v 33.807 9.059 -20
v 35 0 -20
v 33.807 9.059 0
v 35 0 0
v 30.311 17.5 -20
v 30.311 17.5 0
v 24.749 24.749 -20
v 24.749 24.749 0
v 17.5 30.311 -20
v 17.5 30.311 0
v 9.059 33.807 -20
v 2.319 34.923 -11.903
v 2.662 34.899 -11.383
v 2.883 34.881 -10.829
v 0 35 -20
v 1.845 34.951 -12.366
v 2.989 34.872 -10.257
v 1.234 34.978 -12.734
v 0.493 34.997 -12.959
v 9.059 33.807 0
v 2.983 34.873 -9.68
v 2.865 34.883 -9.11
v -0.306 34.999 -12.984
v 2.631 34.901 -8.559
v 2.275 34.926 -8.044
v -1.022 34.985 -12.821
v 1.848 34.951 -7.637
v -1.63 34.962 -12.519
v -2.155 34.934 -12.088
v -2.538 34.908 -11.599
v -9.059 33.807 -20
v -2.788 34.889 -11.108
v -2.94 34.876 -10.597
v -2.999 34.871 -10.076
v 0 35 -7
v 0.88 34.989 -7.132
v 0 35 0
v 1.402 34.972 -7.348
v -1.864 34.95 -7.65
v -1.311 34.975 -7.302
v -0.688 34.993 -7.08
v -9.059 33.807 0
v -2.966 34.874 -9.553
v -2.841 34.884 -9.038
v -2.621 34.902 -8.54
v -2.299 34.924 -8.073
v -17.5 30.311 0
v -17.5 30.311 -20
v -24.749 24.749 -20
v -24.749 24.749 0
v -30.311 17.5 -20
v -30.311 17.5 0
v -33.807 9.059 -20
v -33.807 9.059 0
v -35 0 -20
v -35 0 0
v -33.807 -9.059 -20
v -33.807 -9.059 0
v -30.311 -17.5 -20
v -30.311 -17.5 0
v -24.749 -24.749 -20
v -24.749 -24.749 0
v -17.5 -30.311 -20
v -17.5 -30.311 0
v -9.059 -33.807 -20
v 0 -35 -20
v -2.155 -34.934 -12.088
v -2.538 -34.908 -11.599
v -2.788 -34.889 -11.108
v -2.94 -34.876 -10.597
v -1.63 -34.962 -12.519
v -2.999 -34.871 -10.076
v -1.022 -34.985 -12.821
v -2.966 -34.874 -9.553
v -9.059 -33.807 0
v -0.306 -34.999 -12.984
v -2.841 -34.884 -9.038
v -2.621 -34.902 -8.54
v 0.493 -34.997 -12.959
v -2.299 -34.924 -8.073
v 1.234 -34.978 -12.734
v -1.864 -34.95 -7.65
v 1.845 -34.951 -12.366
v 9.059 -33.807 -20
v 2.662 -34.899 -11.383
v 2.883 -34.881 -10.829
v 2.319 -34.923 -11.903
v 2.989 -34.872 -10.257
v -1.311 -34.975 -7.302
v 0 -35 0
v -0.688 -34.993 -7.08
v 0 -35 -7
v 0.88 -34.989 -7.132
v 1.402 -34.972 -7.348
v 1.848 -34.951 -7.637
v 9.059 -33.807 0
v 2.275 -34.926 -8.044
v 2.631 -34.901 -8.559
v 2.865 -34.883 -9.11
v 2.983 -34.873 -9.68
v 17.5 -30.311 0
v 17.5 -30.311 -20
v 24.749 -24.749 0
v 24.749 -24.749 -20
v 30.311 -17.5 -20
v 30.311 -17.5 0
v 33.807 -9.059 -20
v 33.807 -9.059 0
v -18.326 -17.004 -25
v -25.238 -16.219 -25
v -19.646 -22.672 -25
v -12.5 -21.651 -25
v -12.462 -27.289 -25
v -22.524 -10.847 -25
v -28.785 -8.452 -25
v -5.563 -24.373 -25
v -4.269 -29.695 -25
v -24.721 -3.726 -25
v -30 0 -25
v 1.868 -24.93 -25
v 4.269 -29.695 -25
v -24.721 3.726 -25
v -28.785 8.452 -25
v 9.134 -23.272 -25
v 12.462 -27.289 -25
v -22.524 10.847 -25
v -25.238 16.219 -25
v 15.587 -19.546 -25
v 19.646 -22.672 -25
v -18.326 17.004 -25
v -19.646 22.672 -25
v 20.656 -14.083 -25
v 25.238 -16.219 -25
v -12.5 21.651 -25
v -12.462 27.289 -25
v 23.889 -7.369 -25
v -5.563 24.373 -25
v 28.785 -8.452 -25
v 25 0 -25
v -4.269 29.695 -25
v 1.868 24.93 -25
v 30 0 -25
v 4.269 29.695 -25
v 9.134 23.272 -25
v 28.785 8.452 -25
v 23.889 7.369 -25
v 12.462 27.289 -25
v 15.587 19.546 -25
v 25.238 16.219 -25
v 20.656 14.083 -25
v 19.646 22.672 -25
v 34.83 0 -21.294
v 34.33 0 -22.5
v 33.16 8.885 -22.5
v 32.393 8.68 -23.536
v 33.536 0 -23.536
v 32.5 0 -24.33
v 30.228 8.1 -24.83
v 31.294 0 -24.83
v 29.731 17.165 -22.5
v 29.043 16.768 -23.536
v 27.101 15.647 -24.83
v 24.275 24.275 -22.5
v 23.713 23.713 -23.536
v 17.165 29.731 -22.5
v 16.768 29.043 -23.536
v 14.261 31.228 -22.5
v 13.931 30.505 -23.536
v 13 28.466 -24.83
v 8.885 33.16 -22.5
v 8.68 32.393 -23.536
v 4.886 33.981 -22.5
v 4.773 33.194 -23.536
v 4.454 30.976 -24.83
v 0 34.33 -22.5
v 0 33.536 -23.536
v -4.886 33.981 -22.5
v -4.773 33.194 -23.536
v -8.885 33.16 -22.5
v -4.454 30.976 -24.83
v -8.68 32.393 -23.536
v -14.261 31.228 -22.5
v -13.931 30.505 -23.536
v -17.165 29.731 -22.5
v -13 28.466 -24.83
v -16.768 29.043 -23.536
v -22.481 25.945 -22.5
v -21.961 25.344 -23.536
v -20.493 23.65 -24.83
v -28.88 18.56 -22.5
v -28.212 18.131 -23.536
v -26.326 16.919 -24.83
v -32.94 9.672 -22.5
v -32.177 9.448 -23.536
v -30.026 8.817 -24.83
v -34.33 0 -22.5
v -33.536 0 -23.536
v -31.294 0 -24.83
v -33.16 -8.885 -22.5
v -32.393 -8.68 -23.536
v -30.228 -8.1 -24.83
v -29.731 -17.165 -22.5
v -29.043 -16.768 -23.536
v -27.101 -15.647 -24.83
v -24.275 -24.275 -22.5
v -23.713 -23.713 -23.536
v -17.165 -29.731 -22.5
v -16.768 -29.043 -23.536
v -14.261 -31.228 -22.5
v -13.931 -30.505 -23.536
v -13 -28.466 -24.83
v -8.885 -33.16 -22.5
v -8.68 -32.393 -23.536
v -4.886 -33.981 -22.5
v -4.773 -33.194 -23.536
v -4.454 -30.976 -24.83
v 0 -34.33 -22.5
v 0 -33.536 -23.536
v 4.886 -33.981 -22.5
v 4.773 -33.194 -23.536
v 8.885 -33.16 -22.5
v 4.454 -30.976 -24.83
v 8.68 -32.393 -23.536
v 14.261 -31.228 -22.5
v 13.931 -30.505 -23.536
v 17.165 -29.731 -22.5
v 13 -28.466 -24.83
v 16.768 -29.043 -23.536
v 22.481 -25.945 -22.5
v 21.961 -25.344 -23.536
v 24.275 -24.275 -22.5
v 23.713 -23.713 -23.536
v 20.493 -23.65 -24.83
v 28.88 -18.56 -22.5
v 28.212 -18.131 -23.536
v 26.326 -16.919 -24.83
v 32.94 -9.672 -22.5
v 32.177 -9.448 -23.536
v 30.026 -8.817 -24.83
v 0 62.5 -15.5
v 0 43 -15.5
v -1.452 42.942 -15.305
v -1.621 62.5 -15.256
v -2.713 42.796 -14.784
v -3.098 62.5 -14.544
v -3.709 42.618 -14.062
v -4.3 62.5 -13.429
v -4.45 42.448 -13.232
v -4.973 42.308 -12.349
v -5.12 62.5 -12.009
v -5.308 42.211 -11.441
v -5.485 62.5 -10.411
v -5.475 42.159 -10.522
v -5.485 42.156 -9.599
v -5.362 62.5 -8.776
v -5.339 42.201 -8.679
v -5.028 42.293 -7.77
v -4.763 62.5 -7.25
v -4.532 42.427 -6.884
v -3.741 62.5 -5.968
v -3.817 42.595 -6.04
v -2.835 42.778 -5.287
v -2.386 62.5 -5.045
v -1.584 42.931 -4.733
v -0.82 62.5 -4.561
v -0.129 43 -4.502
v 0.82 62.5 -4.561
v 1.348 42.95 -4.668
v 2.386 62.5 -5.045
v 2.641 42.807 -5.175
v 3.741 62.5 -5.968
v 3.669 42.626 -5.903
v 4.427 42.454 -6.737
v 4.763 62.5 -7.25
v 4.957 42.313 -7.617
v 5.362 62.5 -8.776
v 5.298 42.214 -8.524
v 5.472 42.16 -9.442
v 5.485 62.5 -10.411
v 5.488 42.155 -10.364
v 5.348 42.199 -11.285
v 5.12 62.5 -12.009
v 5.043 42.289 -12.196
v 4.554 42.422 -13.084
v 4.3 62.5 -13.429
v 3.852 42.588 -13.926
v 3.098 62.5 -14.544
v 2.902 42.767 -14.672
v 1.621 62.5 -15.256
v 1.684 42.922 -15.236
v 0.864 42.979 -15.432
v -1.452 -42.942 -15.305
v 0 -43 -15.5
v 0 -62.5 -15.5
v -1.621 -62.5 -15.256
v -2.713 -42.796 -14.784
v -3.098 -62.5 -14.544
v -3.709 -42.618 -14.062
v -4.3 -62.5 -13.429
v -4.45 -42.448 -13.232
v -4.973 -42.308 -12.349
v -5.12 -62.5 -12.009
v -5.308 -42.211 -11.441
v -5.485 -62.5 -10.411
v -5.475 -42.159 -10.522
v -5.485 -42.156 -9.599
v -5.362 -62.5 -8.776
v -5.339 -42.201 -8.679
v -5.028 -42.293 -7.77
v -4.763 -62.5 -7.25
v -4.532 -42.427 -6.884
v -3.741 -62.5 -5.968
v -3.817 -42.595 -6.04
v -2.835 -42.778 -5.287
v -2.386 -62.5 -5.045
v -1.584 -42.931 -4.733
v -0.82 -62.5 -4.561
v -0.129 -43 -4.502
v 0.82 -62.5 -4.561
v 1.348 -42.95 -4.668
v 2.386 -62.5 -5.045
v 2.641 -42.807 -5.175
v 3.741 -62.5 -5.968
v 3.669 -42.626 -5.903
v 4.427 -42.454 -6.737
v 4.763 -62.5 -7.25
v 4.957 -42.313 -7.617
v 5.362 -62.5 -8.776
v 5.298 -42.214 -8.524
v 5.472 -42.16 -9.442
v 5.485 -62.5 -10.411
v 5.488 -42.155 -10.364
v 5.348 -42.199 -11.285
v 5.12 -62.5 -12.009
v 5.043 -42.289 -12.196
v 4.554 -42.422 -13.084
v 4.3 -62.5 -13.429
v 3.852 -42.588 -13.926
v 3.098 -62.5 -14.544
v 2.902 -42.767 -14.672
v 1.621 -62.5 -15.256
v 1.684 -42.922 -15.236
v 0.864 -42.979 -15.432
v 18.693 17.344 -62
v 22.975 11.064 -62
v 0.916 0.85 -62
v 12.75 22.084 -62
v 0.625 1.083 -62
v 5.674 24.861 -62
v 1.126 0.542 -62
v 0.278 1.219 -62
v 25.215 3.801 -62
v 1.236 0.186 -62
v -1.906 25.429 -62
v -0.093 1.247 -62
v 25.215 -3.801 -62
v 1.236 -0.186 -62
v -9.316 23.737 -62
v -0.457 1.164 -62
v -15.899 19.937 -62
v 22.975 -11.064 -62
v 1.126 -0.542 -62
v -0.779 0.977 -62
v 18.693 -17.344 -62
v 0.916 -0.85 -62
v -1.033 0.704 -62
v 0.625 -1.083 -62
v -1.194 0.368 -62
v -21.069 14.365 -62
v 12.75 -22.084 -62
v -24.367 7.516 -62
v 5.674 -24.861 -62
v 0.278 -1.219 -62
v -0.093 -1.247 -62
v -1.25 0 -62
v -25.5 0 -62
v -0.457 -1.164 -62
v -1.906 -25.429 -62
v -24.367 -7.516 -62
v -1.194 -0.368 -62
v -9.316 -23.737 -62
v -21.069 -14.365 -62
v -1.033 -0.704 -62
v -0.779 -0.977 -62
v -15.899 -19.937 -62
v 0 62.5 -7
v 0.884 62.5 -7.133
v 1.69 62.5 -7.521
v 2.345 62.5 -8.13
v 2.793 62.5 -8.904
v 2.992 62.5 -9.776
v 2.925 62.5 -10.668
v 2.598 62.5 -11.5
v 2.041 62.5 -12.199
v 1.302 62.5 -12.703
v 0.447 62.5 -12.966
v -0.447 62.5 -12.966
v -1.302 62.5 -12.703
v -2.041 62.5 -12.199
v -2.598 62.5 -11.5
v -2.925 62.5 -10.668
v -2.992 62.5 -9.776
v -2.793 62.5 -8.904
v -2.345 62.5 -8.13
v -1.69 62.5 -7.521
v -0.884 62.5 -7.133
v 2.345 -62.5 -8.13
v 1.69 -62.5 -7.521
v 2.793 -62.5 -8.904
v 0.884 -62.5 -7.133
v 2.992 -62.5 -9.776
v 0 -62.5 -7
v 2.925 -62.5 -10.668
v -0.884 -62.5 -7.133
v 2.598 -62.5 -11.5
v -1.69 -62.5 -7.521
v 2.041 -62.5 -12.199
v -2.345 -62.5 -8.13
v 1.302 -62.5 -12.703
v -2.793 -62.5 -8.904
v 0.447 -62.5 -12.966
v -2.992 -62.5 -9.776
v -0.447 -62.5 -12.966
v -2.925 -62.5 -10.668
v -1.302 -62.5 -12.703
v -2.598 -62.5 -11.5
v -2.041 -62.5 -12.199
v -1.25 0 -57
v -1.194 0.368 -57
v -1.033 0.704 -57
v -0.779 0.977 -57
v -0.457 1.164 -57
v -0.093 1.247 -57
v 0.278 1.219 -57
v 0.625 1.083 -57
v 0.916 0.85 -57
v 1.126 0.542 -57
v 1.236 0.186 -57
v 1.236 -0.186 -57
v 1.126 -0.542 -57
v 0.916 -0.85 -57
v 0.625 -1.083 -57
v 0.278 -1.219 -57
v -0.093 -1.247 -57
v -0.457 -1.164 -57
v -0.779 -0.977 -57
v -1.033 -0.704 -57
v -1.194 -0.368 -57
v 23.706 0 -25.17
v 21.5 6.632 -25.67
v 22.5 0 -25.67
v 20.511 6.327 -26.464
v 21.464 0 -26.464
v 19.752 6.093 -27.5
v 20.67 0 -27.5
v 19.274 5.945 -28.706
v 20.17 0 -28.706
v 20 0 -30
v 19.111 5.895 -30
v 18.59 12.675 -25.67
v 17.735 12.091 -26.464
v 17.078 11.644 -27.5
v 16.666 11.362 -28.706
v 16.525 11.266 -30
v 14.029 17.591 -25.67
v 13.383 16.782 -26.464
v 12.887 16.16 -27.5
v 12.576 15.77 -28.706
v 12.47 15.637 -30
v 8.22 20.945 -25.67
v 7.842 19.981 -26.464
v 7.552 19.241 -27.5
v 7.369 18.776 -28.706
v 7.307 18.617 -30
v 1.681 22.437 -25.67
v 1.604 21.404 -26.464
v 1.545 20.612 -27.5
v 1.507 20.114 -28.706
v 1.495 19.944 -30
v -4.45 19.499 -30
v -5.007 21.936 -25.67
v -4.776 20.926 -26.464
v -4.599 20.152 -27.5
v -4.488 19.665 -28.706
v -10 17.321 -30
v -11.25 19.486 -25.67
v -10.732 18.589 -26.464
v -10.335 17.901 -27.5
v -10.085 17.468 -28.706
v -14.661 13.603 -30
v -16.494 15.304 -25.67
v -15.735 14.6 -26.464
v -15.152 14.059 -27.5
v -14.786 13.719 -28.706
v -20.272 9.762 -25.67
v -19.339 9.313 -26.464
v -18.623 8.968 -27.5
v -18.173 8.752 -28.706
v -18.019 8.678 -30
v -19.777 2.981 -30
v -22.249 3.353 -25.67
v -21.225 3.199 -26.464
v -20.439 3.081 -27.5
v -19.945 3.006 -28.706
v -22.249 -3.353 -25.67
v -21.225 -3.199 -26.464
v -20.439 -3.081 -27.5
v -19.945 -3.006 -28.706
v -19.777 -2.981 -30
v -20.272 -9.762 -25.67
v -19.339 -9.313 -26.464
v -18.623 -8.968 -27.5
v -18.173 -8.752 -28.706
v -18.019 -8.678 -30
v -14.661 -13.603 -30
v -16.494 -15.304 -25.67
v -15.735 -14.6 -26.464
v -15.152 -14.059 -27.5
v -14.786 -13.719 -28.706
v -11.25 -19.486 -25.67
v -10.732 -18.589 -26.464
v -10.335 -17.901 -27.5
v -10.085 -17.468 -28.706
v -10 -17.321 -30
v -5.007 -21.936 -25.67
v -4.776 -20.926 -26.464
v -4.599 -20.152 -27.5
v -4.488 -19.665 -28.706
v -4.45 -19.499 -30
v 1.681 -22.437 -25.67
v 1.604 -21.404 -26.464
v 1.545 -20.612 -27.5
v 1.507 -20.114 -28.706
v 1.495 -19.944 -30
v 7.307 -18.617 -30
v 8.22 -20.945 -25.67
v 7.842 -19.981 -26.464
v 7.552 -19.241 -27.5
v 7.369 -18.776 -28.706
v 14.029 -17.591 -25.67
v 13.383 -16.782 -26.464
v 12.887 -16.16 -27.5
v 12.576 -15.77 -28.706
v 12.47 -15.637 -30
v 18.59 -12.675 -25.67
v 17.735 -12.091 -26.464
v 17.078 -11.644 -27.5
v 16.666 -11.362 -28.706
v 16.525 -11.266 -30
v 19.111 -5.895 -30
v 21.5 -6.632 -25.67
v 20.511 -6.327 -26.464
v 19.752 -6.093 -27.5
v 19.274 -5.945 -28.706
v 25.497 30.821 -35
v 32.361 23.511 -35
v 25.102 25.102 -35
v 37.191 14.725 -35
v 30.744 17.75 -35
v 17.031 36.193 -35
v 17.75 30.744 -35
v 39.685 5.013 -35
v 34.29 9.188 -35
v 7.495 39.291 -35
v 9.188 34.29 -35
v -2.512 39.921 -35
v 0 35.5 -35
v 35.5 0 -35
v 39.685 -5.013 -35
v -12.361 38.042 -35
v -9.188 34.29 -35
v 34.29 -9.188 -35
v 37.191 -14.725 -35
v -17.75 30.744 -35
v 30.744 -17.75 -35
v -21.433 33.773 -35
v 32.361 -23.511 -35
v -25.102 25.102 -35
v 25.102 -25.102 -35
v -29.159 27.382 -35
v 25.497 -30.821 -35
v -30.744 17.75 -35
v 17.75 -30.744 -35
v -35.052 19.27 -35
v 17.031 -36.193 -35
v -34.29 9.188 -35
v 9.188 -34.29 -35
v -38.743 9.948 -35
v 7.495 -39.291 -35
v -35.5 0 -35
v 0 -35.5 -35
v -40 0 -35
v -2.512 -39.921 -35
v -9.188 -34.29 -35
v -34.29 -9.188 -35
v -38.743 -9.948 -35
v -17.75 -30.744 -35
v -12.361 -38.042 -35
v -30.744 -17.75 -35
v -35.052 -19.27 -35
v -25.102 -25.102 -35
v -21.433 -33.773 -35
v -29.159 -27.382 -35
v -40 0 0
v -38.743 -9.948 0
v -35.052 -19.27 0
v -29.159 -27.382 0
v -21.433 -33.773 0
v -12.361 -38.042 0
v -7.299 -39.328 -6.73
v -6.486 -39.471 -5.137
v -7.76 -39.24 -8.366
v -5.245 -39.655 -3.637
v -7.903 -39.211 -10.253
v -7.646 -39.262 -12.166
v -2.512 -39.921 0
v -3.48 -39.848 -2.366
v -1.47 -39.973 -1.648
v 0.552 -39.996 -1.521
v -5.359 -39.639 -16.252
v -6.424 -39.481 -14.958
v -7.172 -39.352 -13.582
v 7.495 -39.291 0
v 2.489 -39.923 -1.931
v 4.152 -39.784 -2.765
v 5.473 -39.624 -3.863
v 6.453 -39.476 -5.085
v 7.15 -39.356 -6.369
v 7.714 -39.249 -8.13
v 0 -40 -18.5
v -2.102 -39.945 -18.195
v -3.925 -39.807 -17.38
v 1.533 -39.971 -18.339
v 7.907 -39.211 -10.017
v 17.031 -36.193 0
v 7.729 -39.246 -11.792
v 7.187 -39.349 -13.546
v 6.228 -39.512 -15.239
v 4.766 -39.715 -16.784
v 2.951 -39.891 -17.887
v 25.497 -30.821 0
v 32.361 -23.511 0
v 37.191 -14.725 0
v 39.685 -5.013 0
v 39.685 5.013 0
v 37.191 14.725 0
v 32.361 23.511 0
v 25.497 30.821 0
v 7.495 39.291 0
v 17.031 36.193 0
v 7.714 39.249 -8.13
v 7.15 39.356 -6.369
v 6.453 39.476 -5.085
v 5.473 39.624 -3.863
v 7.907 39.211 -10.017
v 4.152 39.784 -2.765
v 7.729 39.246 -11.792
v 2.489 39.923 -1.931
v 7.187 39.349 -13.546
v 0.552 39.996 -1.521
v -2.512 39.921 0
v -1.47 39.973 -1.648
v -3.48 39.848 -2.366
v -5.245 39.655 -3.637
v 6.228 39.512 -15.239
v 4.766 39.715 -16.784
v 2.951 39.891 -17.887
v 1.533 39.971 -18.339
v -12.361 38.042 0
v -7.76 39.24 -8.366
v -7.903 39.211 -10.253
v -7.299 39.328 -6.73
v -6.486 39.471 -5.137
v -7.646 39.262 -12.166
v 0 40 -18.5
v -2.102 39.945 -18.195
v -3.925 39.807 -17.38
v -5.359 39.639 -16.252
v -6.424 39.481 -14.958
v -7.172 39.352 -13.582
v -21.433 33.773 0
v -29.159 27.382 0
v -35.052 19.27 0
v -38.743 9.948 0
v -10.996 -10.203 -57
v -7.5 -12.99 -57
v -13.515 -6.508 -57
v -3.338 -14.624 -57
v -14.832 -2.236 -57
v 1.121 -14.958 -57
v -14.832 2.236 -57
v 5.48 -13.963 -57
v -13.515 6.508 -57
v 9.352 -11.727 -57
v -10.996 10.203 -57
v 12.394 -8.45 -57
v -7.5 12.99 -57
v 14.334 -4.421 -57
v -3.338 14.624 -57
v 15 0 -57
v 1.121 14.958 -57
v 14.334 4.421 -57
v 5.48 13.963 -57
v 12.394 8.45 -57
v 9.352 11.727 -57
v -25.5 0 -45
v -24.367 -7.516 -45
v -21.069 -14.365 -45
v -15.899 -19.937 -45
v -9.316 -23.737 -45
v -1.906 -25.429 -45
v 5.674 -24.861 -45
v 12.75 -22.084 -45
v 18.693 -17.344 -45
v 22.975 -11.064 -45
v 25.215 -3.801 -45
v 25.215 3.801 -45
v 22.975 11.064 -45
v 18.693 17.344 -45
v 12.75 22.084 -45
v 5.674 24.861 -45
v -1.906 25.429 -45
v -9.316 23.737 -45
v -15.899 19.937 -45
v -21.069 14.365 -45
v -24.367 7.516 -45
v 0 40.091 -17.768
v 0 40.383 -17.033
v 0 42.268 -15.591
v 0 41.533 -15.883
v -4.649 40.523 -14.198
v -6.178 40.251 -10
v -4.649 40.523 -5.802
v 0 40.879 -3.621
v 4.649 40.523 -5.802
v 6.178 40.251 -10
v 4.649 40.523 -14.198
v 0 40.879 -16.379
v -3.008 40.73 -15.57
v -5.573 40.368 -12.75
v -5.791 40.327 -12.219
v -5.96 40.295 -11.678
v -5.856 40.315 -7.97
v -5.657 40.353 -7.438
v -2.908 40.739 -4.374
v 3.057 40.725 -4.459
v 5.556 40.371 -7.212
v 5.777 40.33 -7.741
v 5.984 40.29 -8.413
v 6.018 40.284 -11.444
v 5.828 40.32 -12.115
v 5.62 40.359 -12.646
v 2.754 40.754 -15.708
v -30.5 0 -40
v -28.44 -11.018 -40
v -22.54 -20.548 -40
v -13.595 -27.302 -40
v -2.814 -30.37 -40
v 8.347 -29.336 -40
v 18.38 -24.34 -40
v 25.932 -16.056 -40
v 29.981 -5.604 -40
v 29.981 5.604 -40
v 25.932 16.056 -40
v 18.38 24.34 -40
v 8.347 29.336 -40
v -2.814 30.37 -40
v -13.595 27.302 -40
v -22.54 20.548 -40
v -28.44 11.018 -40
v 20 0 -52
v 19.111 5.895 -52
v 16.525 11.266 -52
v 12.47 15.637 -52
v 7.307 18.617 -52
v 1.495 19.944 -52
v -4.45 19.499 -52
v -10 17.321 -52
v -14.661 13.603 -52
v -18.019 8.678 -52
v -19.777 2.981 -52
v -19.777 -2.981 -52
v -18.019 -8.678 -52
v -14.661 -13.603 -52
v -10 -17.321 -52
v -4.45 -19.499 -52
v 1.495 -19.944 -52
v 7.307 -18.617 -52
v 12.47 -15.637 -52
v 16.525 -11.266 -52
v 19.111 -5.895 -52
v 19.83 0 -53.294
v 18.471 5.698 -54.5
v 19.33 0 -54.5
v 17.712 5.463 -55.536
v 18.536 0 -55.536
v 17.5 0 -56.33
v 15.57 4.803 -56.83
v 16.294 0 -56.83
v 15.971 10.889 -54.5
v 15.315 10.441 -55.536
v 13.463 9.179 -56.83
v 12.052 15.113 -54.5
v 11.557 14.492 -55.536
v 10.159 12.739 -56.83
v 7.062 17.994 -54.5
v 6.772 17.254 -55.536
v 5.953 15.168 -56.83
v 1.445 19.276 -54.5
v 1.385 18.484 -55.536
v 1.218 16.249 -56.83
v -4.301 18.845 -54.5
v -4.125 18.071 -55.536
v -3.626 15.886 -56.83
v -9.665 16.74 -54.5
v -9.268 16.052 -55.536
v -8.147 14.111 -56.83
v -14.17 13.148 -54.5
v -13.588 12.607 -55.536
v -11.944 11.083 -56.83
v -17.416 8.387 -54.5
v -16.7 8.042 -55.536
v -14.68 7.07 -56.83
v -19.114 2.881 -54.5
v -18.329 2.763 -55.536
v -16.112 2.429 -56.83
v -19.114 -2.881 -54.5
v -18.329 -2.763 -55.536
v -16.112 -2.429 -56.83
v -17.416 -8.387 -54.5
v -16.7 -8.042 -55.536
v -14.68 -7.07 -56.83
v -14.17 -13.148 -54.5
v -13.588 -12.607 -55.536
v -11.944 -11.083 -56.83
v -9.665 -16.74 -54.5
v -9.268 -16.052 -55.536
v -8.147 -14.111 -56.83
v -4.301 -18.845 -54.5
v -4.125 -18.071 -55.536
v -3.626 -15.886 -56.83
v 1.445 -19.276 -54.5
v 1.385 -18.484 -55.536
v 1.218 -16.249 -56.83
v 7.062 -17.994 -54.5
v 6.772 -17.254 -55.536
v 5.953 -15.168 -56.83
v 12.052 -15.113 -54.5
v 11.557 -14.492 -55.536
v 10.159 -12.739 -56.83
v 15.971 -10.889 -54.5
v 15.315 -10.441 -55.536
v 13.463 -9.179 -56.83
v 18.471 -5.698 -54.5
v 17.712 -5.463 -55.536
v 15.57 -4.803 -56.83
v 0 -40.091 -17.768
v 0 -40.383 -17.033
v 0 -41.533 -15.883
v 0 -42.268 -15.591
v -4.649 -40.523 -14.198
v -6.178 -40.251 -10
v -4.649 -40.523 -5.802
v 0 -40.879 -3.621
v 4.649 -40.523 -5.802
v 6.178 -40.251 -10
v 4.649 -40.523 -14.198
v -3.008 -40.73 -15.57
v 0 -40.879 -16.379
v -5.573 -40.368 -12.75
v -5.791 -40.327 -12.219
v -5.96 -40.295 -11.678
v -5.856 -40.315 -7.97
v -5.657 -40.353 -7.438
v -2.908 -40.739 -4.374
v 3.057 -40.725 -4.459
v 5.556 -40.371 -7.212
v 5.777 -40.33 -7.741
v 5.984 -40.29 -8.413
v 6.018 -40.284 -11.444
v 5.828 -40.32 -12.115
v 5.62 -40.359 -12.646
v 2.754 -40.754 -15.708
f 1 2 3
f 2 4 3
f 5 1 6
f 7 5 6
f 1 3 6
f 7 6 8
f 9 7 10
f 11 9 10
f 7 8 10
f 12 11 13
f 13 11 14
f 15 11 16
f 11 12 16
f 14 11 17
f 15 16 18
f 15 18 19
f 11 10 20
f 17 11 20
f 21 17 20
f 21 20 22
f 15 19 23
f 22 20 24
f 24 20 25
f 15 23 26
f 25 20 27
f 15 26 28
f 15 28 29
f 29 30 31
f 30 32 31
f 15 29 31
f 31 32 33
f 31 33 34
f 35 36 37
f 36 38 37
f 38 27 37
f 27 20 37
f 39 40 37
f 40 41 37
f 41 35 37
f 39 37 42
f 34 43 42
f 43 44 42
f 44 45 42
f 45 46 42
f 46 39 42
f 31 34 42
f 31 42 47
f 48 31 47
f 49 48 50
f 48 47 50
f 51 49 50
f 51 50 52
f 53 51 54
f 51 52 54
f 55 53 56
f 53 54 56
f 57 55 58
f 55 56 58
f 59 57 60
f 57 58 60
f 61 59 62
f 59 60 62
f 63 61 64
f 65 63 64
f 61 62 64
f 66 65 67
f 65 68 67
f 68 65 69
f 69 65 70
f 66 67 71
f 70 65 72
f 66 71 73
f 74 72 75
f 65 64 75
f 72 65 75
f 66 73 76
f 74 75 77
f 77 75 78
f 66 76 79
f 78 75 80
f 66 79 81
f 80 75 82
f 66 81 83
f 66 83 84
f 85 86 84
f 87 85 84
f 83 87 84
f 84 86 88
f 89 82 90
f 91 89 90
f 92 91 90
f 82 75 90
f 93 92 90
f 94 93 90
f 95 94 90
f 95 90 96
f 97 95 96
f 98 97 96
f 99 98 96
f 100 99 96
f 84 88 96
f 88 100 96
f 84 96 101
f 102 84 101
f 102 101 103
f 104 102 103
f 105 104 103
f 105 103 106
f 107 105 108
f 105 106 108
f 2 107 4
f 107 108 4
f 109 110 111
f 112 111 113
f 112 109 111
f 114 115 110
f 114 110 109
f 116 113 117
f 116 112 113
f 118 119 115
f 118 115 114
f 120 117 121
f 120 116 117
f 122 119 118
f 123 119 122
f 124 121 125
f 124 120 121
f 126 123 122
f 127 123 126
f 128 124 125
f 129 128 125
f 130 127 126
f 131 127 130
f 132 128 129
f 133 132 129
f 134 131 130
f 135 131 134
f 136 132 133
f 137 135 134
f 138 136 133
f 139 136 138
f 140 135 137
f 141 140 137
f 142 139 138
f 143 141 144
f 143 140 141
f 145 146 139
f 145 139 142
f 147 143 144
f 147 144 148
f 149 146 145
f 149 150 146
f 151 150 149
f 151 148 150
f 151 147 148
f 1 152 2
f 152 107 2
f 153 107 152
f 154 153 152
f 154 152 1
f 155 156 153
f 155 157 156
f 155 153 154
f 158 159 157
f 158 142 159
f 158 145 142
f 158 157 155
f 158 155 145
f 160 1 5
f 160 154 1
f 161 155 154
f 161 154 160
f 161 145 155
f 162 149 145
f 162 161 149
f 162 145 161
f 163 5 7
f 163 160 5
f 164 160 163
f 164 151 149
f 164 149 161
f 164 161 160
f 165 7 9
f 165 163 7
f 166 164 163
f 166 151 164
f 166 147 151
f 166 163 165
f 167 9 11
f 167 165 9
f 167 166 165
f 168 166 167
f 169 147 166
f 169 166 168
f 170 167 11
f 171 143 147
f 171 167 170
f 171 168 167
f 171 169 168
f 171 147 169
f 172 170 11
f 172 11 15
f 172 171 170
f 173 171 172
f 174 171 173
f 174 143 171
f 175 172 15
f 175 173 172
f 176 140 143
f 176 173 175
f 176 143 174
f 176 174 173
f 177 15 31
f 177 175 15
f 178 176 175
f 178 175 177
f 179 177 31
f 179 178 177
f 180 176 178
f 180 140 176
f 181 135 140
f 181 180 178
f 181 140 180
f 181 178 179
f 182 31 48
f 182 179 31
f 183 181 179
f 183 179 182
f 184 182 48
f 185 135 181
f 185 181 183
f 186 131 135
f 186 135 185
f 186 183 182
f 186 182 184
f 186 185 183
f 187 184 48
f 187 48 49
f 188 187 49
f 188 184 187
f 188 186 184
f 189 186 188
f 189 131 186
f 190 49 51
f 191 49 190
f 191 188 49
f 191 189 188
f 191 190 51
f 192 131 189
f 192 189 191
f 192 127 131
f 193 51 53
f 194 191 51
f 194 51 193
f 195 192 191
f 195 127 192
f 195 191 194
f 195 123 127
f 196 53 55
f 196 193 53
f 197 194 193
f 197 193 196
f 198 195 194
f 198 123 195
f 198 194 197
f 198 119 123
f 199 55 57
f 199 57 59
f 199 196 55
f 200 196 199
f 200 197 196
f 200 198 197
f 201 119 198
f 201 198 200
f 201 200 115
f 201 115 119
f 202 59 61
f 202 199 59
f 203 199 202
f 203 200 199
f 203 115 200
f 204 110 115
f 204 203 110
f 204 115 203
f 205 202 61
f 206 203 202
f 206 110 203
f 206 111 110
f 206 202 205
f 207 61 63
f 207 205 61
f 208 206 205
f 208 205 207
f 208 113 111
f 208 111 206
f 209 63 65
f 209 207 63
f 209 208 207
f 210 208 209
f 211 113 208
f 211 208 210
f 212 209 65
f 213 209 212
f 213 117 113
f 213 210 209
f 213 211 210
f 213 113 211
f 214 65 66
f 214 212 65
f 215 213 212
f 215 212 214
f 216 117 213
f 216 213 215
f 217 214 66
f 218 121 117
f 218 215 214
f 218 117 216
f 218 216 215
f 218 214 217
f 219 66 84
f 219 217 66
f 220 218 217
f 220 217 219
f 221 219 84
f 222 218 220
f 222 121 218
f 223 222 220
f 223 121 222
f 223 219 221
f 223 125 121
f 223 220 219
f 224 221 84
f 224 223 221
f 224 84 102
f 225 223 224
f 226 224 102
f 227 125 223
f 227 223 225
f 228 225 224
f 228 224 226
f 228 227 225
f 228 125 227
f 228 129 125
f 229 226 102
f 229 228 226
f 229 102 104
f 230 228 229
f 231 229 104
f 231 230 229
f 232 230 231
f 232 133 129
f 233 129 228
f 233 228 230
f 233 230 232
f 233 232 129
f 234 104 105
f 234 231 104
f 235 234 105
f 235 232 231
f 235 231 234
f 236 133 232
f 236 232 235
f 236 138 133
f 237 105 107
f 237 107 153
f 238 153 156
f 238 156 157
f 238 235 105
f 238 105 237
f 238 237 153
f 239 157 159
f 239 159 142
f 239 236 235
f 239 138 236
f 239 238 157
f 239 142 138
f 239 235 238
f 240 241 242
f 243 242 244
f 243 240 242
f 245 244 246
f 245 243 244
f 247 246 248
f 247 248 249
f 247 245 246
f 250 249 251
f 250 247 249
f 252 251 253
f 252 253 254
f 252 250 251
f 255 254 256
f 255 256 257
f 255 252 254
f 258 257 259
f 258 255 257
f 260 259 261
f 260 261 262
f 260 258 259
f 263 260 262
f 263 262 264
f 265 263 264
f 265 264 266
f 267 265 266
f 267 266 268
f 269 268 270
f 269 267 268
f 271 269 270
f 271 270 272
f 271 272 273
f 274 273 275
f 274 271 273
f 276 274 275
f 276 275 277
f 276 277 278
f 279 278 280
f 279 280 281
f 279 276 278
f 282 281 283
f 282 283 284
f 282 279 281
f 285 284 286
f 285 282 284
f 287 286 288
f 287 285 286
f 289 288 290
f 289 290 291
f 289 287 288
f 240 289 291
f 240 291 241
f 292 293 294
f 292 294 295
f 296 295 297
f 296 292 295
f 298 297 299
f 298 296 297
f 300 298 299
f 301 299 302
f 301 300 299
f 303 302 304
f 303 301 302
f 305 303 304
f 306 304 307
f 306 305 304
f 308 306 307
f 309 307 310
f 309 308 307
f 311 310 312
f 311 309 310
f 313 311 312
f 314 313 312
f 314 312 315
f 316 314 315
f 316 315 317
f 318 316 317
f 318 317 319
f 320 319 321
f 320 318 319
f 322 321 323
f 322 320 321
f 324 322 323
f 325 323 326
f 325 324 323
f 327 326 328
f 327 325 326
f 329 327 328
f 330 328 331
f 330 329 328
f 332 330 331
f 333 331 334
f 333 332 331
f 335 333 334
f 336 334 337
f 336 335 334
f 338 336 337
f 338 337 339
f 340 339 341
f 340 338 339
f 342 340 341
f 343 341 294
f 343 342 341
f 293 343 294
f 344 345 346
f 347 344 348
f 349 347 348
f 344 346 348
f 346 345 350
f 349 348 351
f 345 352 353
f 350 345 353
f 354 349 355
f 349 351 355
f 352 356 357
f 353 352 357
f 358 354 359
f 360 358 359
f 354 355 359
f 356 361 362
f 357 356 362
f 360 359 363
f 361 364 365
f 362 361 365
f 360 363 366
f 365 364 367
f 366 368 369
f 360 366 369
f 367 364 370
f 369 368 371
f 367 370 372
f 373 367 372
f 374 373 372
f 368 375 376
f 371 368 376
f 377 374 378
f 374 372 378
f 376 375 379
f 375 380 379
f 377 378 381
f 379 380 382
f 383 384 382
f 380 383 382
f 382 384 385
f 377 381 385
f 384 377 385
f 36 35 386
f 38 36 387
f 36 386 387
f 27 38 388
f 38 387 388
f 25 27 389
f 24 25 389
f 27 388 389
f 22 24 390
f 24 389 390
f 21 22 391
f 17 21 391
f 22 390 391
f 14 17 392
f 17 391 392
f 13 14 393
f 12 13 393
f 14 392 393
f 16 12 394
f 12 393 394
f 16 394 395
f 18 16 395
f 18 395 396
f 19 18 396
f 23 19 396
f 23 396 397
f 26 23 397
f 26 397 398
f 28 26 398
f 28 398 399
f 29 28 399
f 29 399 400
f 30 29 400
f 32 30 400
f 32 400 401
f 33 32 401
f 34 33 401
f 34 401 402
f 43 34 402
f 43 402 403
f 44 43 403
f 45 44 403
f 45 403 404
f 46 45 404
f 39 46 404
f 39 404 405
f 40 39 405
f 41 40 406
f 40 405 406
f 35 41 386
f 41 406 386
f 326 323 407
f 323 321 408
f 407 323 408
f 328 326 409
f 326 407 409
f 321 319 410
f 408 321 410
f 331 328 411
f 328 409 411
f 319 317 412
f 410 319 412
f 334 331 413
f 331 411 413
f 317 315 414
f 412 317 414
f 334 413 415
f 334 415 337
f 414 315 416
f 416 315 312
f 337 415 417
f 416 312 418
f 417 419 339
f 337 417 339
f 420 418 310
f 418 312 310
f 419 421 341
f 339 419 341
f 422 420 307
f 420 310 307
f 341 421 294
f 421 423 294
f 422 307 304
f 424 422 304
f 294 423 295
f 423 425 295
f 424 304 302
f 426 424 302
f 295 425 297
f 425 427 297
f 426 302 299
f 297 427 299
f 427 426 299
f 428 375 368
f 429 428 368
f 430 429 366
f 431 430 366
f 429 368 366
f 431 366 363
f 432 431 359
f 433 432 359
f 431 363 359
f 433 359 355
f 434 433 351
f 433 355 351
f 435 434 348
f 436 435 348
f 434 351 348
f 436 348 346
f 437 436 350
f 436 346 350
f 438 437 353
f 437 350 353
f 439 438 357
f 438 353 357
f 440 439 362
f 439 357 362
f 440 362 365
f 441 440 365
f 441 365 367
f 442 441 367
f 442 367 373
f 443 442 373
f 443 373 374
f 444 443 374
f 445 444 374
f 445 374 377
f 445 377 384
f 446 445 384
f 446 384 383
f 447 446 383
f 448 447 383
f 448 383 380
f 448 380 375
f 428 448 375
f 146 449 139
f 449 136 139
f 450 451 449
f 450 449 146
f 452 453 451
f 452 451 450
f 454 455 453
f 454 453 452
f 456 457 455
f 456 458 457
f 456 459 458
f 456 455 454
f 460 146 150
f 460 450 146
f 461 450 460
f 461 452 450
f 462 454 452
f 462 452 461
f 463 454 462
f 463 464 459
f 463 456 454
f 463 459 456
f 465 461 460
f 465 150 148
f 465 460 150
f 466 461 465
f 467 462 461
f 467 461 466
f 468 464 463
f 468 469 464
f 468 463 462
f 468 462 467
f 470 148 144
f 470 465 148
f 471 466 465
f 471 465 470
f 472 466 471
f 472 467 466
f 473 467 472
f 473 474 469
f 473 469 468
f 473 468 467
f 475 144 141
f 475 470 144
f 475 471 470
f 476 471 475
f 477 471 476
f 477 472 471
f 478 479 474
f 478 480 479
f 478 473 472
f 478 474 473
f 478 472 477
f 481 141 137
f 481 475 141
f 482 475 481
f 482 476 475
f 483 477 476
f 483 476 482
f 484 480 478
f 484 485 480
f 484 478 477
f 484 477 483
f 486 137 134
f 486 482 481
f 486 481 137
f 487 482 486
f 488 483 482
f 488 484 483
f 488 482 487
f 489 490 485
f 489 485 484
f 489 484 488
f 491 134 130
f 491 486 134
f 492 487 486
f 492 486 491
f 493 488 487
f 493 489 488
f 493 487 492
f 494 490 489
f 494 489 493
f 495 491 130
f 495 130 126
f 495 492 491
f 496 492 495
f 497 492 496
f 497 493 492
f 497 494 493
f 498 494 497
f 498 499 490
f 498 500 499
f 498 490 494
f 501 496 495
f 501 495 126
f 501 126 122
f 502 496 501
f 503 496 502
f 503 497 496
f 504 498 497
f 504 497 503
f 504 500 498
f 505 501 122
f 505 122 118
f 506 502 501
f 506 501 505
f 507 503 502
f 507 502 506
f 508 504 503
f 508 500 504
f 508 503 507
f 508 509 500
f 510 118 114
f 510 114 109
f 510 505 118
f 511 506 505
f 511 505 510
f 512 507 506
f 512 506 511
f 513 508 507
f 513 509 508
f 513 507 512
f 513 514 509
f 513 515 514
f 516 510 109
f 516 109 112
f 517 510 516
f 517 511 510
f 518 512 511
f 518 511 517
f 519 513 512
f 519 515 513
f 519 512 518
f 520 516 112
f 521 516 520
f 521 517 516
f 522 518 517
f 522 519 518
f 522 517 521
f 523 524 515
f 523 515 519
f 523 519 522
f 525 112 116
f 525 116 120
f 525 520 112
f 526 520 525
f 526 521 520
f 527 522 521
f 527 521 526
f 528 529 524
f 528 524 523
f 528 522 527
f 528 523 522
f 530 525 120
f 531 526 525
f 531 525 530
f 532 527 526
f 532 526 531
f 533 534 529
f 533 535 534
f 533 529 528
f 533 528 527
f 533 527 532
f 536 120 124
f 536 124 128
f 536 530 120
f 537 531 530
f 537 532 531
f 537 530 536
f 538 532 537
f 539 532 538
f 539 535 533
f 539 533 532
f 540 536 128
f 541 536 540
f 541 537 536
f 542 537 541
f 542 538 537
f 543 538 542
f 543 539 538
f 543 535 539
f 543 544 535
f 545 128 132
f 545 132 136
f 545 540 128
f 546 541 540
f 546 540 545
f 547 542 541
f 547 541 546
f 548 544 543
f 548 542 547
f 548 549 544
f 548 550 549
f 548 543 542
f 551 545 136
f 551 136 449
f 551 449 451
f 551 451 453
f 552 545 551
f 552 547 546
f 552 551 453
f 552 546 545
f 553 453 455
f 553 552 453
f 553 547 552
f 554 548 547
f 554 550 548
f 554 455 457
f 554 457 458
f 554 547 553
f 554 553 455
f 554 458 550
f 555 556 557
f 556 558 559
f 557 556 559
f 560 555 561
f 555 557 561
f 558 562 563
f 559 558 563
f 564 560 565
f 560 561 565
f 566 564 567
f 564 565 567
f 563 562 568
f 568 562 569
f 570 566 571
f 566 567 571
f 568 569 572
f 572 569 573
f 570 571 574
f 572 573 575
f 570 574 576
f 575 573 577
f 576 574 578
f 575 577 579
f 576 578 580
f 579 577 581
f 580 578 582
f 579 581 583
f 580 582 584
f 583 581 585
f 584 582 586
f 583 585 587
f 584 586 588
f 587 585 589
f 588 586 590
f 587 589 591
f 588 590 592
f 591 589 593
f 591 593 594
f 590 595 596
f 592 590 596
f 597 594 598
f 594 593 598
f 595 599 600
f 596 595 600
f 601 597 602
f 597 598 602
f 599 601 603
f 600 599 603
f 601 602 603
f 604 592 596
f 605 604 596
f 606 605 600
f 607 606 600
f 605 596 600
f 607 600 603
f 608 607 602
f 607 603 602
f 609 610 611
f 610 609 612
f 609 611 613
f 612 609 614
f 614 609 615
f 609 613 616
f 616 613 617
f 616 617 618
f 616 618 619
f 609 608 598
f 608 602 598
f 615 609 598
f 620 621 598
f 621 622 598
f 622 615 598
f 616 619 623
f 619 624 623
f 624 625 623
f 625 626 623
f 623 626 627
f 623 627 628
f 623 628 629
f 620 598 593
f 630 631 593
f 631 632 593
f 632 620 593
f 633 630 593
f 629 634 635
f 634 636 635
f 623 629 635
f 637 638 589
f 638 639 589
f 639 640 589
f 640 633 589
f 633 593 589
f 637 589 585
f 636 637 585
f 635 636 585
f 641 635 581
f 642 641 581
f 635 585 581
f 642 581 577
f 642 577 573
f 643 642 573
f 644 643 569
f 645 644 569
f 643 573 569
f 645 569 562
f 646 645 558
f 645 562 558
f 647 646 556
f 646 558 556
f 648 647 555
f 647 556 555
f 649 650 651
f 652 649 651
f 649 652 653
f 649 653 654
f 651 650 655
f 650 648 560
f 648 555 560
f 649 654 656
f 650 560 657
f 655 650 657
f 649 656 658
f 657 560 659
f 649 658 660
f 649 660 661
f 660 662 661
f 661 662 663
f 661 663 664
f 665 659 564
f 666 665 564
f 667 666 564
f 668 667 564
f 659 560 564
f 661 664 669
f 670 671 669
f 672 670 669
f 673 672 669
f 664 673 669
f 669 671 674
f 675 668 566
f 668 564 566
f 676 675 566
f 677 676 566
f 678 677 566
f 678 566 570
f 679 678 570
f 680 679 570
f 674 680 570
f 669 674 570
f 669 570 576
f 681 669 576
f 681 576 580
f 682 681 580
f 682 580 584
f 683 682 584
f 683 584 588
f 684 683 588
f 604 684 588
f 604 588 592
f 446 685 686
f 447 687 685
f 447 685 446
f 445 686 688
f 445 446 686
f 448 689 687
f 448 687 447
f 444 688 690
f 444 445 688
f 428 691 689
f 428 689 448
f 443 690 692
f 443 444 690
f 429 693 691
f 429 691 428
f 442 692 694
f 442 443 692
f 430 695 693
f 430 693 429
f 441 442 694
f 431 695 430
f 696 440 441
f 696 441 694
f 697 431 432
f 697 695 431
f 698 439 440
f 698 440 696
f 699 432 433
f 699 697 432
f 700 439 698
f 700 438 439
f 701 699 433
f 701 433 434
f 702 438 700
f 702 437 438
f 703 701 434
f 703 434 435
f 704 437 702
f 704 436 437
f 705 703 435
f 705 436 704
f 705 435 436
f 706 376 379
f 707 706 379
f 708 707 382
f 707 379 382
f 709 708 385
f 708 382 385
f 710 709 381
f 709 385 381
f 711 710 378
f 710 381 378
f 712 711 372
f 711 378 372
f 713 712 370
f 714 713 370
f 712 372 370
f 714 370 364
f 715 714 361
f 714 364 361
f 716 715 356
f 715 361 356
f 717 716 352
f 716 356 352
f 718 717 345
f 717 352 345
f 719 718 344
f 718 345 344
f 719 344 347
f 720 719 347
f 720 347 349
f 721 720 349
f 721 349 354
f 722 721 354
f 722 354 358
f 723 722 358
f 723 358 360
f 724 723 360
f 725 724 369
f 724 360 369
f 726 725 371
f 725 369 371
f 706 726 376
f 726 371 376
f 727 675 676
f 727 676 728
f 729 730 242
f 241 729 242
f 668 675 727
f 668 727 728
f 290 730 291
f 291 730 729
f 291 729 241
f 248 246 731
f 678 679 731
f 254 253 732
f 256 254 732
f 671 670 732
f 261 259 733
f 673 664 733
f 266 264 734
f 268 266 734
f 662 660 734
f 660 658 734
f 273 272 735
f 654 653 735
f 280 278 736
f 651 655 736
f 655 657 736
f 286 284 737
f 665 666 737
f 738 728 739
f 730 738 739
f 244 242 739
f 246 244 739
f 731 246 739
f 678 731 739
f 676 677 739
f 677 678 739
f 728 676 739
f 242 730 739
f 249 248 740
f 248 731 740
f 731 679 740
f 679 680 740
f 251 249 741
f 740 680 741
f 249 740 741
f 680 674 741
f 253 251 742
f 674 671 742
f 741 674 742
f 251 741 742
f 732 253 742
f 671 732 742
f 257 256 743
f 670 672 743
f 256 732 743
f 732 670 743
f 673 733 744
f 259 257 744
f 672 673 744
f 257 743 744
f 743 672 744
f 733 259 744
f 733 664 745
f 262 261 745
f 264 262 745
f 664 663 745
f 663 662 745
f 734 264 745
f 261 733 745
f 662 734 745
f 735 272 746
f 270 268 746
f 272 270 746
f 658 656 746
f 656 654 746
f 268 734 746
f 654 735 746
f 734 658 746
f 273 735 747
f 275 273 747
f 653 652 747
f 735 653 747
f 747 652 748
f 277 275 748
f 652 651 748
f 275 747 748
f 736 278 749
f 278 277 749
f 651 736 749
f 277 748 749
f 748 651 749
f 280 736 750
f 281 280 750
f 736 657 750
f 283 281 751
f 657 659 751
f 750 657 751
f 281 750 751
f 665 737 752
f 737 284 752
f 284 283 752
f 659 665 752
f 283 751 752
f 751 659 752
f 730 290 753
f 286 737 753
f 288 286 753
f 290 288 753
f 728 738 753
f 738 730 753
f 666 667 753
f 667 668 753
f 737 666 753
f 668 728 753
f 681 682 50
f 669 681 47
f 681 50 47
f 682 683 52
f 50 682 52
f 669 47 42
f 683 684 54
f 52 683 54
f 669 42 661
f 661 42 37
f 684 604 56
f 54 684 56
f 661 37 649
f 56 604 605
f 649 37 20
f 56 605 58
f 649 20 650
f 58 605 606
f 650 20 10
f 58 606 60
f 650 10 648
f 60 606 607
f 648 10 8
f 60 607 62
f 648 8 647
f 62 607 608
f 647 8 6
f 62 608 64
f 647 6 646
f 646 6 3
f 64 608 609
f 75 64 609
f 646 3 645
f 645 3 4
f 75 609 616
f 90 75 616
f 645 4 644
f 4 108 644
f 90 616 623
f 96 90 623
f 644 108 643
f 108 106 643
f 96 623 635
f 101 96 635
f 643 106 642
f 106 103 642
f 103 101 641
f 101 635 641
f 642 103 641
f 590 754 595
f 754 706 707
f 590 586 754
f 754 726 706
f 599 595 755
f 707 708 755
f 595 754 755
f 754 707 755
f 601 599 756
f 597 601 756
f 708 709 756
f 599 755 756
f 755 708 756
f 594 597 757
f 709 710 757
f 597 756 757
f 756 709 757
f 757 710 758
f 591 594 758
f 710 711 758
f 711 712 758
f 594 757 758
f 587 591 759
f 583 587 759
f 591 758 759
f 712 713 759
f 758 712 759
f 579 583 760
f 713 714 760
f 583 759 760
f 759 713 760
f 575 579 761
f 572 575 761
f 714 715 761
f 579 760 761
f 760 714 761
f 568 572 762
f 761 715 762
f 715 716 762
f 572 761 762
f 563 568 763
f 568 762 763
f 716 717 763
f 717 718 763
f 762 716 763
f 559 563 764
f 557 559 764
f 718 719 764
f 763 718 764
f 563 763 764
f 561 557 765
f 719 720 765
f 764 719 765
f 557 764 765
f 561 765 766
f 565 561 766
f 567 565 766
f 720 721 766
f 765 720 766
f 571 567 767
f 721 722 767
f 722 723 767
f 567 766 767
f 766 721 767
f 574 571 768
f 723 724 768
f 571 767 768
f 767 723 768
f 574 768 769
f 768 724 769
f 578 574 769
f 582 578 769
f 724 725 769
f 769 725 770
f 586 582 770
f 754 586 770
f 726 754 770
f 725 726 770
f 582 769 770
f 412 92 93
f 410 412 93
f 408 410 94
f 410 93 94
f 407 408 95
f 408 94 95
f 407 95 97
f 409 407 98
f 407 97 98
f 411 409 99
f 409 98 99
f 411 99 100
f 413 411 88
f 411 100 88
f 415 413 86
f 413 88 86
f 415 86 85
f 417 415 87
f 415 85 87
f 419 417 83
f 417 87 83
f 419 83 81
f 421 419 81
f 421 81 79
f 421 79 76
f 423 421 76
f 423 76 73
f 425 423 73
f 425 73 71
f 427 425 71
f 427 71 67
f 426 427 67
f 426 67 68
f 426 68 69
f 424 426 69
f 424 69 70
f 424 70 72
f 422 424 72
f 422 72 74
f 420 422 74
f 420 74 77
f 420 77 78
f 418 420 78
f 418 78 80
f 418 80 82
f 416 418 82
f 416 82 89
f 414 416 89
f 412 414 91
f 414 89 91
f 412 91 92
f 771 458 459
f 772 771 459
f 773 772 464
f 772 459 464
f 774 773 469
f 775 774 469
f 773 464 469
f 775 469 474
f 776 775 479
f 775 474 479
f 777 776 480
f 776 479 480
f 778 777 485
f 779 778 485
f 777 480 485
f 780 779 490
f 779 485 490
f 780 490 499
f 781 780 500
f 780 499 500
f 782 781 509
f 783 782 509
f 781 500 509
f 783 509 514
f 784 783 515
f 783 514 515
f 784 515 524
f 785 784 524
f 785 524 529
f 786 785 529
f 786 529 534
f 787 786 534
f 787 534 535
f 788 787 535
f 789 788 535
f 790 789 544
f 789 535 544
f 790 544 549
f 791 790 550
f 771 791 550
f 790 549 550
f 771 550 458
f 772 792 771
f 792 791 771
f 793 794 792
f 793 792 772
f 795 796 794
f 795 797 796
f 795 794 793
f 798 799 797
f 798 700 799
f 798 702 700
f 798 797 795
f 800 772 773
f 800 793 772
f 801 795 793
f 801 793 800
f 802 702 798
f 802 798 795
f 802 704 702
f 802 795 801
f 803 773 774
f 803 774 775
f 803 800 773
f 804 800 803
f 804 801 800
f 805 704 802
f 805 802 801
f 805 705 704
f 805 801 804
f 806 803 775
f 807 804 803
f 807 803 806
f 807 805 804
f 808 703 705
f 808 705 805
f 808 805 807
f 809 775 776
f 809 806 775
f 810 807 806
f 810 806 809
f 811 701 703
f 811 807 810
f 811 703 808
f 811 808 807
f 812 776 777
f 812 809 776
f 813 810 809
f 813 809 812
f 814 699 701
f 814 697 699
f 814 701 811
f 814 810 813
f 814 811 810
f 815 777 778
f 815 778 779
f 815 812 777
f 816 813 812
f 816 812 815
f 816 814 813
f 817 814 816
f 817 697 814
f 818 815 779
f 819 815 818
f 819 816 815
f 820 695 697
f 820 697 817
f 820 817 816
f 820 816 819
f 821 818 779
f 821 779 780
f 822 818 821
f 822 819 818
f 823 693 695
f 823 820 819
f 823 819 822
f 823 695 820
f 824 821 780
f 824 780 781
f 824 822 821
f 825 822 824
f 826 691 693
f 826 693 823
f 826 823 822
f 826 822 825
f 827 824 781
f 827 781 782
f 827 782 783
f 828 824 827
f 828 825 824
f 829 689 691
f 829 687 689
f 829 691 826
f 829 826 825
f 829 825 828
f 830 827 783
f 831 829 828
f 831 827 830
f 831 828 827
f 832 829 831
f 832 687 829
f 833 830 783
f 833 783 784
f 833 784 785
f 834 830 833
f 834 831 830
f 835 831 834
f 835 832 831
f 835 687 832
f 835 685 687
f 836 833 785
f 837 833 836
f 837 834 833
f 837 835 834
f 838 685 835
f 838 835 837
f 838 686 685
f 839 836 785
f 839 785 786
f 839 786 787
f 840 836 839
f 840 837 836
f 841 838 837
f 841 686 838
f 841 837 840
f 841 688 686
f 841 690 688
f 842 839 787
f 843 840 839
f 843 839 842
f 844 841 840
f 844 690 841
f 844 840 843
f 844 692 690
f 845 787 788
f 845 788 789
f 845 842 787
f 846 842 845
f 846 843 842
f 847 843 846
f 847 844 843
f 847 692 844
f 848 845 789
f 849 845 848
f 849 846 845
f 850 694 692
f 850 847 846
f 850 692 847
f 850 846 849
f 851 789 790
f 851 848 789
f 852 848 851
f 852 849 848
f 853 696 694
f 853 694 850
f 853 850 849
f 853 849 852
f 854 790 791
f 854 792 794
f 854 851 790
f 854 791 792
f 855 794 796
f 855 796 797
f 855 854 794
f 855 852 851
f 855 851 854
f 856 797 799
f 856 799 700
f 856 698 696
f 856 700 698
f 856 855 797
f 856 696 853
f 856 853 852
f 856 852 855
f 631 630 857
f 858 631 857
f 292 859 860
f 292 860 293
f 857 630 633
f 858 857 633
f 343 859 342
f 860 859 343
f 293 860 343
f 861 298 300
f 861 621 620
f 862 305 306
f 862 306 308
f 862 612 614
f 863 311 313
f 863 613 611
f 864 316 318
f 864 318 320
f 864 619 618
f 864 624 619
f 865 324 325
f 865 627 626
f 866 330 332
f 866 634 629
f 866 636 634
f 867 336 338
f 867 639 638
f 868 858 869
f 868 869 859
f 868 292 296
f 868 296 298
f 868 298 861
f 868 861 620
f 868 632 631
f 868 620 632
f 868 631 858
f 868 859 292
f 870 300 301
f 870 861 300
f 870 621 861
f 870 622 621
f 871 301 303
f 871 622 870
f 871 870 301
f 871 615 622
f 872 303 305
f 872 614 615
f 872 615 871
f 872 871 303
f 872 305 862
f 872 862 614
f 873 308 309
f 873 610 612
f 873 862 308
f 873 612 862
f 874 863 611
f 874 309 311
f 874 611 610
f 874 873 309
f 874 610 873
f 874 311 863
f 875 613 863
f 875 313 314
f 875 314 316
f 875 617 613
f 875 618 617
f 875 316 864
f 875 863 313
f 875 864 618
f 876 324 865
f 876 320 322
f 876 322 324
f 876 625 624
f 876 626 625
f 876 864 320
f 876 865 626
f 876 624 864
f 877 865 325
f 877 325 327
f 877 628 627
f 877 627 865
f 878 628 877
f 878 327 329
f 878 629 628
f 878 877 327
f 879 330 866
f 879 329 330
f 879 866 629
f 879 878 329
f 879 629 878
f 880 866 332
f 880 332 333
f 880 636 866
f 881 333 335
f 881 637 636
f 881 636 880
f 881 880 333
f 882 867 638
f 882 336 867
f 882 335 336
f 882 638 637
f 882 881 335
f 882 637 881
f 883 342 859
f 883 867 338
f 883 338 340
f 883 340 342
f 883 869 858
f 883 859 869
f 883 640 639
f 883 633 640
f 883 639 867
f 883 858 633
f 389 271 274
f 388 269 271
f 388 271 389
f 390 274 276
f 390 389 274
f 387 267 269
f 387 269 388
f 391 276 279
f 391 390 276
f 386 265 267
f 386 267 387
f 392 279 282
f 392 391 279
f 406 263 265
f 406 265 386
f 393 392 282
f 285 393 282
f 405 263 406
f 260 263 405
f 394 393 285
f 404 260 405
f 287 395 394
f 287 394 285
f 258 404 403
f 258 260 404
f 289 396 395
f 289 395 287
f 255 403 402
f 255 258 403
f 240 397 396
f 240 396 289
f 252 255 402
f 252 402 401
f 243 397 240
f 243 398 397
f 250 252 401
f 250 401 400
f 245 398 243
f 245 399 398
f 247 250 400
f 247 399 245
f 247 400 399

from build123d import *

# Parameters (mm, degrees)
CHAMFER1_SIZE       = 10
SKETCH2_R           = 1.25
CUT_EXTRUDE1_DEPTH  = 30
SKETCH5_R           = 5.5
BOSS_EXTRUDE1_DEPTH = 62.5
SKETCH3_R           = 35
CUT_EXTRUDE2_DEPTH  = 25
SKETCH4_R           = 20
CUT_EXTRUDE3_DEPTH  = 32
FILLET1_R           = 5
FILLET2_R           = 3
SKETCH6_R           = 3
CUT_EXTRUDE4_DEPTH  = 146.151644955


with BuildPart() as part:
    # Sketch1 → Revolve1 (revolve)
    with BuildSketch(Plane(origin=(0, 0, 0), x_dir=(1, 0, 0), z_dir=(0, 1, 0)), mode=Mode.PRIVATE) as revolve1_sk:
        Polygon((0, 0), (40, 0), (40, 35), (25.5, 35), (25.5, 62), (0, 62), align=None)
    revolve(revolve1_sk.sketch.rotate(Axis((0, 0, -62), (0, 0, 1)), 180), axis=Axis((0, 0, -62), (0, 0, 1)))

    # Chamfer1
    chamfer1_edges = [part.edges().sort_by_distance(p)[0] for p in [
        (25.5, 0, -35),
    ]]
    chamfer(chamfer1_edges, length=CHAMFER1_SIZE)

    # Sketch2 → Cut-Extrude1 (cut)
    with BuildSketch(Plane(origin=(0, 0, -62), x_dir=(-1, 0, 0), z_dir=(0, 0, -1))):
        Circle(SKETCH2_R)
    extrude(amount=-CUT_EXTRUDE1_DEPTH, mode=Mode.SUBTRACT)

    # Sketch5 → Boss-Extrude1 (add, symmetric)
    with BuildSketch(Plane(origin=(0, 0, 0), x_dir=(1, 0, 0), z_dir=(0, 1, 0))):
        with Locations(Location((0, 10, 0), (0, 0, 90))):
            Circle(SKETCH5_R)
    extrude(amount=BOSS_EXTRUDE1_DEPTH, both=True)

    # Sketch3 → Cut-Extrude2 (cut)
    with BuildSketch(Plane.XY):
        Circle(SKETCH3_R)
    extrude(amount=-CUT_EXTRUDE2_DEPTH, mode=Mode.SUBTRACT)

    # Sketch4 → Cut-Extrude3 (cut)
    with BuildSketch(Plane.XY.offset(-25)):
        Circle(SKETCH4_R)
    extrude(amount=-CUT_EXTRUDE3_DEPTH, mode=Mode.SUBTRACT)

    # Fillet1
    fillet1_edges = [part.edges().sort_by_distance(p)[0] for p in [
        (-35, 0, -25),
        (-20, 0, -57),
        (-20, 0, -25),
    ]]
    fillet(fillet1_edges, radius=FILLET1_R)

    # Fillet2
    fillet2_edges = [part.edges().sort_by_distance(p)[0] for p in [
        (0, -40, -4.5),
        (0, 40, -4.5),
    ]]
    fillet(fillet2_edges, radius=FILLET2_R)

    # Sketch6 → Cut-Extrude4 (cut, through all)
    with BuildSketch(Plane(origin=(0, 62.5, 0), x_dir=(1, 0, 0), z_dir=(0, 1, 0))):
        with Locations(Location((0, 10, 0), (0, 0, 270))):
            Circle(SKETCH6_R)
    extrude(amount=-CUT_EXTRUDE4_DEPTH, mode=Mode.SUBTRACT)


solid = part.part
